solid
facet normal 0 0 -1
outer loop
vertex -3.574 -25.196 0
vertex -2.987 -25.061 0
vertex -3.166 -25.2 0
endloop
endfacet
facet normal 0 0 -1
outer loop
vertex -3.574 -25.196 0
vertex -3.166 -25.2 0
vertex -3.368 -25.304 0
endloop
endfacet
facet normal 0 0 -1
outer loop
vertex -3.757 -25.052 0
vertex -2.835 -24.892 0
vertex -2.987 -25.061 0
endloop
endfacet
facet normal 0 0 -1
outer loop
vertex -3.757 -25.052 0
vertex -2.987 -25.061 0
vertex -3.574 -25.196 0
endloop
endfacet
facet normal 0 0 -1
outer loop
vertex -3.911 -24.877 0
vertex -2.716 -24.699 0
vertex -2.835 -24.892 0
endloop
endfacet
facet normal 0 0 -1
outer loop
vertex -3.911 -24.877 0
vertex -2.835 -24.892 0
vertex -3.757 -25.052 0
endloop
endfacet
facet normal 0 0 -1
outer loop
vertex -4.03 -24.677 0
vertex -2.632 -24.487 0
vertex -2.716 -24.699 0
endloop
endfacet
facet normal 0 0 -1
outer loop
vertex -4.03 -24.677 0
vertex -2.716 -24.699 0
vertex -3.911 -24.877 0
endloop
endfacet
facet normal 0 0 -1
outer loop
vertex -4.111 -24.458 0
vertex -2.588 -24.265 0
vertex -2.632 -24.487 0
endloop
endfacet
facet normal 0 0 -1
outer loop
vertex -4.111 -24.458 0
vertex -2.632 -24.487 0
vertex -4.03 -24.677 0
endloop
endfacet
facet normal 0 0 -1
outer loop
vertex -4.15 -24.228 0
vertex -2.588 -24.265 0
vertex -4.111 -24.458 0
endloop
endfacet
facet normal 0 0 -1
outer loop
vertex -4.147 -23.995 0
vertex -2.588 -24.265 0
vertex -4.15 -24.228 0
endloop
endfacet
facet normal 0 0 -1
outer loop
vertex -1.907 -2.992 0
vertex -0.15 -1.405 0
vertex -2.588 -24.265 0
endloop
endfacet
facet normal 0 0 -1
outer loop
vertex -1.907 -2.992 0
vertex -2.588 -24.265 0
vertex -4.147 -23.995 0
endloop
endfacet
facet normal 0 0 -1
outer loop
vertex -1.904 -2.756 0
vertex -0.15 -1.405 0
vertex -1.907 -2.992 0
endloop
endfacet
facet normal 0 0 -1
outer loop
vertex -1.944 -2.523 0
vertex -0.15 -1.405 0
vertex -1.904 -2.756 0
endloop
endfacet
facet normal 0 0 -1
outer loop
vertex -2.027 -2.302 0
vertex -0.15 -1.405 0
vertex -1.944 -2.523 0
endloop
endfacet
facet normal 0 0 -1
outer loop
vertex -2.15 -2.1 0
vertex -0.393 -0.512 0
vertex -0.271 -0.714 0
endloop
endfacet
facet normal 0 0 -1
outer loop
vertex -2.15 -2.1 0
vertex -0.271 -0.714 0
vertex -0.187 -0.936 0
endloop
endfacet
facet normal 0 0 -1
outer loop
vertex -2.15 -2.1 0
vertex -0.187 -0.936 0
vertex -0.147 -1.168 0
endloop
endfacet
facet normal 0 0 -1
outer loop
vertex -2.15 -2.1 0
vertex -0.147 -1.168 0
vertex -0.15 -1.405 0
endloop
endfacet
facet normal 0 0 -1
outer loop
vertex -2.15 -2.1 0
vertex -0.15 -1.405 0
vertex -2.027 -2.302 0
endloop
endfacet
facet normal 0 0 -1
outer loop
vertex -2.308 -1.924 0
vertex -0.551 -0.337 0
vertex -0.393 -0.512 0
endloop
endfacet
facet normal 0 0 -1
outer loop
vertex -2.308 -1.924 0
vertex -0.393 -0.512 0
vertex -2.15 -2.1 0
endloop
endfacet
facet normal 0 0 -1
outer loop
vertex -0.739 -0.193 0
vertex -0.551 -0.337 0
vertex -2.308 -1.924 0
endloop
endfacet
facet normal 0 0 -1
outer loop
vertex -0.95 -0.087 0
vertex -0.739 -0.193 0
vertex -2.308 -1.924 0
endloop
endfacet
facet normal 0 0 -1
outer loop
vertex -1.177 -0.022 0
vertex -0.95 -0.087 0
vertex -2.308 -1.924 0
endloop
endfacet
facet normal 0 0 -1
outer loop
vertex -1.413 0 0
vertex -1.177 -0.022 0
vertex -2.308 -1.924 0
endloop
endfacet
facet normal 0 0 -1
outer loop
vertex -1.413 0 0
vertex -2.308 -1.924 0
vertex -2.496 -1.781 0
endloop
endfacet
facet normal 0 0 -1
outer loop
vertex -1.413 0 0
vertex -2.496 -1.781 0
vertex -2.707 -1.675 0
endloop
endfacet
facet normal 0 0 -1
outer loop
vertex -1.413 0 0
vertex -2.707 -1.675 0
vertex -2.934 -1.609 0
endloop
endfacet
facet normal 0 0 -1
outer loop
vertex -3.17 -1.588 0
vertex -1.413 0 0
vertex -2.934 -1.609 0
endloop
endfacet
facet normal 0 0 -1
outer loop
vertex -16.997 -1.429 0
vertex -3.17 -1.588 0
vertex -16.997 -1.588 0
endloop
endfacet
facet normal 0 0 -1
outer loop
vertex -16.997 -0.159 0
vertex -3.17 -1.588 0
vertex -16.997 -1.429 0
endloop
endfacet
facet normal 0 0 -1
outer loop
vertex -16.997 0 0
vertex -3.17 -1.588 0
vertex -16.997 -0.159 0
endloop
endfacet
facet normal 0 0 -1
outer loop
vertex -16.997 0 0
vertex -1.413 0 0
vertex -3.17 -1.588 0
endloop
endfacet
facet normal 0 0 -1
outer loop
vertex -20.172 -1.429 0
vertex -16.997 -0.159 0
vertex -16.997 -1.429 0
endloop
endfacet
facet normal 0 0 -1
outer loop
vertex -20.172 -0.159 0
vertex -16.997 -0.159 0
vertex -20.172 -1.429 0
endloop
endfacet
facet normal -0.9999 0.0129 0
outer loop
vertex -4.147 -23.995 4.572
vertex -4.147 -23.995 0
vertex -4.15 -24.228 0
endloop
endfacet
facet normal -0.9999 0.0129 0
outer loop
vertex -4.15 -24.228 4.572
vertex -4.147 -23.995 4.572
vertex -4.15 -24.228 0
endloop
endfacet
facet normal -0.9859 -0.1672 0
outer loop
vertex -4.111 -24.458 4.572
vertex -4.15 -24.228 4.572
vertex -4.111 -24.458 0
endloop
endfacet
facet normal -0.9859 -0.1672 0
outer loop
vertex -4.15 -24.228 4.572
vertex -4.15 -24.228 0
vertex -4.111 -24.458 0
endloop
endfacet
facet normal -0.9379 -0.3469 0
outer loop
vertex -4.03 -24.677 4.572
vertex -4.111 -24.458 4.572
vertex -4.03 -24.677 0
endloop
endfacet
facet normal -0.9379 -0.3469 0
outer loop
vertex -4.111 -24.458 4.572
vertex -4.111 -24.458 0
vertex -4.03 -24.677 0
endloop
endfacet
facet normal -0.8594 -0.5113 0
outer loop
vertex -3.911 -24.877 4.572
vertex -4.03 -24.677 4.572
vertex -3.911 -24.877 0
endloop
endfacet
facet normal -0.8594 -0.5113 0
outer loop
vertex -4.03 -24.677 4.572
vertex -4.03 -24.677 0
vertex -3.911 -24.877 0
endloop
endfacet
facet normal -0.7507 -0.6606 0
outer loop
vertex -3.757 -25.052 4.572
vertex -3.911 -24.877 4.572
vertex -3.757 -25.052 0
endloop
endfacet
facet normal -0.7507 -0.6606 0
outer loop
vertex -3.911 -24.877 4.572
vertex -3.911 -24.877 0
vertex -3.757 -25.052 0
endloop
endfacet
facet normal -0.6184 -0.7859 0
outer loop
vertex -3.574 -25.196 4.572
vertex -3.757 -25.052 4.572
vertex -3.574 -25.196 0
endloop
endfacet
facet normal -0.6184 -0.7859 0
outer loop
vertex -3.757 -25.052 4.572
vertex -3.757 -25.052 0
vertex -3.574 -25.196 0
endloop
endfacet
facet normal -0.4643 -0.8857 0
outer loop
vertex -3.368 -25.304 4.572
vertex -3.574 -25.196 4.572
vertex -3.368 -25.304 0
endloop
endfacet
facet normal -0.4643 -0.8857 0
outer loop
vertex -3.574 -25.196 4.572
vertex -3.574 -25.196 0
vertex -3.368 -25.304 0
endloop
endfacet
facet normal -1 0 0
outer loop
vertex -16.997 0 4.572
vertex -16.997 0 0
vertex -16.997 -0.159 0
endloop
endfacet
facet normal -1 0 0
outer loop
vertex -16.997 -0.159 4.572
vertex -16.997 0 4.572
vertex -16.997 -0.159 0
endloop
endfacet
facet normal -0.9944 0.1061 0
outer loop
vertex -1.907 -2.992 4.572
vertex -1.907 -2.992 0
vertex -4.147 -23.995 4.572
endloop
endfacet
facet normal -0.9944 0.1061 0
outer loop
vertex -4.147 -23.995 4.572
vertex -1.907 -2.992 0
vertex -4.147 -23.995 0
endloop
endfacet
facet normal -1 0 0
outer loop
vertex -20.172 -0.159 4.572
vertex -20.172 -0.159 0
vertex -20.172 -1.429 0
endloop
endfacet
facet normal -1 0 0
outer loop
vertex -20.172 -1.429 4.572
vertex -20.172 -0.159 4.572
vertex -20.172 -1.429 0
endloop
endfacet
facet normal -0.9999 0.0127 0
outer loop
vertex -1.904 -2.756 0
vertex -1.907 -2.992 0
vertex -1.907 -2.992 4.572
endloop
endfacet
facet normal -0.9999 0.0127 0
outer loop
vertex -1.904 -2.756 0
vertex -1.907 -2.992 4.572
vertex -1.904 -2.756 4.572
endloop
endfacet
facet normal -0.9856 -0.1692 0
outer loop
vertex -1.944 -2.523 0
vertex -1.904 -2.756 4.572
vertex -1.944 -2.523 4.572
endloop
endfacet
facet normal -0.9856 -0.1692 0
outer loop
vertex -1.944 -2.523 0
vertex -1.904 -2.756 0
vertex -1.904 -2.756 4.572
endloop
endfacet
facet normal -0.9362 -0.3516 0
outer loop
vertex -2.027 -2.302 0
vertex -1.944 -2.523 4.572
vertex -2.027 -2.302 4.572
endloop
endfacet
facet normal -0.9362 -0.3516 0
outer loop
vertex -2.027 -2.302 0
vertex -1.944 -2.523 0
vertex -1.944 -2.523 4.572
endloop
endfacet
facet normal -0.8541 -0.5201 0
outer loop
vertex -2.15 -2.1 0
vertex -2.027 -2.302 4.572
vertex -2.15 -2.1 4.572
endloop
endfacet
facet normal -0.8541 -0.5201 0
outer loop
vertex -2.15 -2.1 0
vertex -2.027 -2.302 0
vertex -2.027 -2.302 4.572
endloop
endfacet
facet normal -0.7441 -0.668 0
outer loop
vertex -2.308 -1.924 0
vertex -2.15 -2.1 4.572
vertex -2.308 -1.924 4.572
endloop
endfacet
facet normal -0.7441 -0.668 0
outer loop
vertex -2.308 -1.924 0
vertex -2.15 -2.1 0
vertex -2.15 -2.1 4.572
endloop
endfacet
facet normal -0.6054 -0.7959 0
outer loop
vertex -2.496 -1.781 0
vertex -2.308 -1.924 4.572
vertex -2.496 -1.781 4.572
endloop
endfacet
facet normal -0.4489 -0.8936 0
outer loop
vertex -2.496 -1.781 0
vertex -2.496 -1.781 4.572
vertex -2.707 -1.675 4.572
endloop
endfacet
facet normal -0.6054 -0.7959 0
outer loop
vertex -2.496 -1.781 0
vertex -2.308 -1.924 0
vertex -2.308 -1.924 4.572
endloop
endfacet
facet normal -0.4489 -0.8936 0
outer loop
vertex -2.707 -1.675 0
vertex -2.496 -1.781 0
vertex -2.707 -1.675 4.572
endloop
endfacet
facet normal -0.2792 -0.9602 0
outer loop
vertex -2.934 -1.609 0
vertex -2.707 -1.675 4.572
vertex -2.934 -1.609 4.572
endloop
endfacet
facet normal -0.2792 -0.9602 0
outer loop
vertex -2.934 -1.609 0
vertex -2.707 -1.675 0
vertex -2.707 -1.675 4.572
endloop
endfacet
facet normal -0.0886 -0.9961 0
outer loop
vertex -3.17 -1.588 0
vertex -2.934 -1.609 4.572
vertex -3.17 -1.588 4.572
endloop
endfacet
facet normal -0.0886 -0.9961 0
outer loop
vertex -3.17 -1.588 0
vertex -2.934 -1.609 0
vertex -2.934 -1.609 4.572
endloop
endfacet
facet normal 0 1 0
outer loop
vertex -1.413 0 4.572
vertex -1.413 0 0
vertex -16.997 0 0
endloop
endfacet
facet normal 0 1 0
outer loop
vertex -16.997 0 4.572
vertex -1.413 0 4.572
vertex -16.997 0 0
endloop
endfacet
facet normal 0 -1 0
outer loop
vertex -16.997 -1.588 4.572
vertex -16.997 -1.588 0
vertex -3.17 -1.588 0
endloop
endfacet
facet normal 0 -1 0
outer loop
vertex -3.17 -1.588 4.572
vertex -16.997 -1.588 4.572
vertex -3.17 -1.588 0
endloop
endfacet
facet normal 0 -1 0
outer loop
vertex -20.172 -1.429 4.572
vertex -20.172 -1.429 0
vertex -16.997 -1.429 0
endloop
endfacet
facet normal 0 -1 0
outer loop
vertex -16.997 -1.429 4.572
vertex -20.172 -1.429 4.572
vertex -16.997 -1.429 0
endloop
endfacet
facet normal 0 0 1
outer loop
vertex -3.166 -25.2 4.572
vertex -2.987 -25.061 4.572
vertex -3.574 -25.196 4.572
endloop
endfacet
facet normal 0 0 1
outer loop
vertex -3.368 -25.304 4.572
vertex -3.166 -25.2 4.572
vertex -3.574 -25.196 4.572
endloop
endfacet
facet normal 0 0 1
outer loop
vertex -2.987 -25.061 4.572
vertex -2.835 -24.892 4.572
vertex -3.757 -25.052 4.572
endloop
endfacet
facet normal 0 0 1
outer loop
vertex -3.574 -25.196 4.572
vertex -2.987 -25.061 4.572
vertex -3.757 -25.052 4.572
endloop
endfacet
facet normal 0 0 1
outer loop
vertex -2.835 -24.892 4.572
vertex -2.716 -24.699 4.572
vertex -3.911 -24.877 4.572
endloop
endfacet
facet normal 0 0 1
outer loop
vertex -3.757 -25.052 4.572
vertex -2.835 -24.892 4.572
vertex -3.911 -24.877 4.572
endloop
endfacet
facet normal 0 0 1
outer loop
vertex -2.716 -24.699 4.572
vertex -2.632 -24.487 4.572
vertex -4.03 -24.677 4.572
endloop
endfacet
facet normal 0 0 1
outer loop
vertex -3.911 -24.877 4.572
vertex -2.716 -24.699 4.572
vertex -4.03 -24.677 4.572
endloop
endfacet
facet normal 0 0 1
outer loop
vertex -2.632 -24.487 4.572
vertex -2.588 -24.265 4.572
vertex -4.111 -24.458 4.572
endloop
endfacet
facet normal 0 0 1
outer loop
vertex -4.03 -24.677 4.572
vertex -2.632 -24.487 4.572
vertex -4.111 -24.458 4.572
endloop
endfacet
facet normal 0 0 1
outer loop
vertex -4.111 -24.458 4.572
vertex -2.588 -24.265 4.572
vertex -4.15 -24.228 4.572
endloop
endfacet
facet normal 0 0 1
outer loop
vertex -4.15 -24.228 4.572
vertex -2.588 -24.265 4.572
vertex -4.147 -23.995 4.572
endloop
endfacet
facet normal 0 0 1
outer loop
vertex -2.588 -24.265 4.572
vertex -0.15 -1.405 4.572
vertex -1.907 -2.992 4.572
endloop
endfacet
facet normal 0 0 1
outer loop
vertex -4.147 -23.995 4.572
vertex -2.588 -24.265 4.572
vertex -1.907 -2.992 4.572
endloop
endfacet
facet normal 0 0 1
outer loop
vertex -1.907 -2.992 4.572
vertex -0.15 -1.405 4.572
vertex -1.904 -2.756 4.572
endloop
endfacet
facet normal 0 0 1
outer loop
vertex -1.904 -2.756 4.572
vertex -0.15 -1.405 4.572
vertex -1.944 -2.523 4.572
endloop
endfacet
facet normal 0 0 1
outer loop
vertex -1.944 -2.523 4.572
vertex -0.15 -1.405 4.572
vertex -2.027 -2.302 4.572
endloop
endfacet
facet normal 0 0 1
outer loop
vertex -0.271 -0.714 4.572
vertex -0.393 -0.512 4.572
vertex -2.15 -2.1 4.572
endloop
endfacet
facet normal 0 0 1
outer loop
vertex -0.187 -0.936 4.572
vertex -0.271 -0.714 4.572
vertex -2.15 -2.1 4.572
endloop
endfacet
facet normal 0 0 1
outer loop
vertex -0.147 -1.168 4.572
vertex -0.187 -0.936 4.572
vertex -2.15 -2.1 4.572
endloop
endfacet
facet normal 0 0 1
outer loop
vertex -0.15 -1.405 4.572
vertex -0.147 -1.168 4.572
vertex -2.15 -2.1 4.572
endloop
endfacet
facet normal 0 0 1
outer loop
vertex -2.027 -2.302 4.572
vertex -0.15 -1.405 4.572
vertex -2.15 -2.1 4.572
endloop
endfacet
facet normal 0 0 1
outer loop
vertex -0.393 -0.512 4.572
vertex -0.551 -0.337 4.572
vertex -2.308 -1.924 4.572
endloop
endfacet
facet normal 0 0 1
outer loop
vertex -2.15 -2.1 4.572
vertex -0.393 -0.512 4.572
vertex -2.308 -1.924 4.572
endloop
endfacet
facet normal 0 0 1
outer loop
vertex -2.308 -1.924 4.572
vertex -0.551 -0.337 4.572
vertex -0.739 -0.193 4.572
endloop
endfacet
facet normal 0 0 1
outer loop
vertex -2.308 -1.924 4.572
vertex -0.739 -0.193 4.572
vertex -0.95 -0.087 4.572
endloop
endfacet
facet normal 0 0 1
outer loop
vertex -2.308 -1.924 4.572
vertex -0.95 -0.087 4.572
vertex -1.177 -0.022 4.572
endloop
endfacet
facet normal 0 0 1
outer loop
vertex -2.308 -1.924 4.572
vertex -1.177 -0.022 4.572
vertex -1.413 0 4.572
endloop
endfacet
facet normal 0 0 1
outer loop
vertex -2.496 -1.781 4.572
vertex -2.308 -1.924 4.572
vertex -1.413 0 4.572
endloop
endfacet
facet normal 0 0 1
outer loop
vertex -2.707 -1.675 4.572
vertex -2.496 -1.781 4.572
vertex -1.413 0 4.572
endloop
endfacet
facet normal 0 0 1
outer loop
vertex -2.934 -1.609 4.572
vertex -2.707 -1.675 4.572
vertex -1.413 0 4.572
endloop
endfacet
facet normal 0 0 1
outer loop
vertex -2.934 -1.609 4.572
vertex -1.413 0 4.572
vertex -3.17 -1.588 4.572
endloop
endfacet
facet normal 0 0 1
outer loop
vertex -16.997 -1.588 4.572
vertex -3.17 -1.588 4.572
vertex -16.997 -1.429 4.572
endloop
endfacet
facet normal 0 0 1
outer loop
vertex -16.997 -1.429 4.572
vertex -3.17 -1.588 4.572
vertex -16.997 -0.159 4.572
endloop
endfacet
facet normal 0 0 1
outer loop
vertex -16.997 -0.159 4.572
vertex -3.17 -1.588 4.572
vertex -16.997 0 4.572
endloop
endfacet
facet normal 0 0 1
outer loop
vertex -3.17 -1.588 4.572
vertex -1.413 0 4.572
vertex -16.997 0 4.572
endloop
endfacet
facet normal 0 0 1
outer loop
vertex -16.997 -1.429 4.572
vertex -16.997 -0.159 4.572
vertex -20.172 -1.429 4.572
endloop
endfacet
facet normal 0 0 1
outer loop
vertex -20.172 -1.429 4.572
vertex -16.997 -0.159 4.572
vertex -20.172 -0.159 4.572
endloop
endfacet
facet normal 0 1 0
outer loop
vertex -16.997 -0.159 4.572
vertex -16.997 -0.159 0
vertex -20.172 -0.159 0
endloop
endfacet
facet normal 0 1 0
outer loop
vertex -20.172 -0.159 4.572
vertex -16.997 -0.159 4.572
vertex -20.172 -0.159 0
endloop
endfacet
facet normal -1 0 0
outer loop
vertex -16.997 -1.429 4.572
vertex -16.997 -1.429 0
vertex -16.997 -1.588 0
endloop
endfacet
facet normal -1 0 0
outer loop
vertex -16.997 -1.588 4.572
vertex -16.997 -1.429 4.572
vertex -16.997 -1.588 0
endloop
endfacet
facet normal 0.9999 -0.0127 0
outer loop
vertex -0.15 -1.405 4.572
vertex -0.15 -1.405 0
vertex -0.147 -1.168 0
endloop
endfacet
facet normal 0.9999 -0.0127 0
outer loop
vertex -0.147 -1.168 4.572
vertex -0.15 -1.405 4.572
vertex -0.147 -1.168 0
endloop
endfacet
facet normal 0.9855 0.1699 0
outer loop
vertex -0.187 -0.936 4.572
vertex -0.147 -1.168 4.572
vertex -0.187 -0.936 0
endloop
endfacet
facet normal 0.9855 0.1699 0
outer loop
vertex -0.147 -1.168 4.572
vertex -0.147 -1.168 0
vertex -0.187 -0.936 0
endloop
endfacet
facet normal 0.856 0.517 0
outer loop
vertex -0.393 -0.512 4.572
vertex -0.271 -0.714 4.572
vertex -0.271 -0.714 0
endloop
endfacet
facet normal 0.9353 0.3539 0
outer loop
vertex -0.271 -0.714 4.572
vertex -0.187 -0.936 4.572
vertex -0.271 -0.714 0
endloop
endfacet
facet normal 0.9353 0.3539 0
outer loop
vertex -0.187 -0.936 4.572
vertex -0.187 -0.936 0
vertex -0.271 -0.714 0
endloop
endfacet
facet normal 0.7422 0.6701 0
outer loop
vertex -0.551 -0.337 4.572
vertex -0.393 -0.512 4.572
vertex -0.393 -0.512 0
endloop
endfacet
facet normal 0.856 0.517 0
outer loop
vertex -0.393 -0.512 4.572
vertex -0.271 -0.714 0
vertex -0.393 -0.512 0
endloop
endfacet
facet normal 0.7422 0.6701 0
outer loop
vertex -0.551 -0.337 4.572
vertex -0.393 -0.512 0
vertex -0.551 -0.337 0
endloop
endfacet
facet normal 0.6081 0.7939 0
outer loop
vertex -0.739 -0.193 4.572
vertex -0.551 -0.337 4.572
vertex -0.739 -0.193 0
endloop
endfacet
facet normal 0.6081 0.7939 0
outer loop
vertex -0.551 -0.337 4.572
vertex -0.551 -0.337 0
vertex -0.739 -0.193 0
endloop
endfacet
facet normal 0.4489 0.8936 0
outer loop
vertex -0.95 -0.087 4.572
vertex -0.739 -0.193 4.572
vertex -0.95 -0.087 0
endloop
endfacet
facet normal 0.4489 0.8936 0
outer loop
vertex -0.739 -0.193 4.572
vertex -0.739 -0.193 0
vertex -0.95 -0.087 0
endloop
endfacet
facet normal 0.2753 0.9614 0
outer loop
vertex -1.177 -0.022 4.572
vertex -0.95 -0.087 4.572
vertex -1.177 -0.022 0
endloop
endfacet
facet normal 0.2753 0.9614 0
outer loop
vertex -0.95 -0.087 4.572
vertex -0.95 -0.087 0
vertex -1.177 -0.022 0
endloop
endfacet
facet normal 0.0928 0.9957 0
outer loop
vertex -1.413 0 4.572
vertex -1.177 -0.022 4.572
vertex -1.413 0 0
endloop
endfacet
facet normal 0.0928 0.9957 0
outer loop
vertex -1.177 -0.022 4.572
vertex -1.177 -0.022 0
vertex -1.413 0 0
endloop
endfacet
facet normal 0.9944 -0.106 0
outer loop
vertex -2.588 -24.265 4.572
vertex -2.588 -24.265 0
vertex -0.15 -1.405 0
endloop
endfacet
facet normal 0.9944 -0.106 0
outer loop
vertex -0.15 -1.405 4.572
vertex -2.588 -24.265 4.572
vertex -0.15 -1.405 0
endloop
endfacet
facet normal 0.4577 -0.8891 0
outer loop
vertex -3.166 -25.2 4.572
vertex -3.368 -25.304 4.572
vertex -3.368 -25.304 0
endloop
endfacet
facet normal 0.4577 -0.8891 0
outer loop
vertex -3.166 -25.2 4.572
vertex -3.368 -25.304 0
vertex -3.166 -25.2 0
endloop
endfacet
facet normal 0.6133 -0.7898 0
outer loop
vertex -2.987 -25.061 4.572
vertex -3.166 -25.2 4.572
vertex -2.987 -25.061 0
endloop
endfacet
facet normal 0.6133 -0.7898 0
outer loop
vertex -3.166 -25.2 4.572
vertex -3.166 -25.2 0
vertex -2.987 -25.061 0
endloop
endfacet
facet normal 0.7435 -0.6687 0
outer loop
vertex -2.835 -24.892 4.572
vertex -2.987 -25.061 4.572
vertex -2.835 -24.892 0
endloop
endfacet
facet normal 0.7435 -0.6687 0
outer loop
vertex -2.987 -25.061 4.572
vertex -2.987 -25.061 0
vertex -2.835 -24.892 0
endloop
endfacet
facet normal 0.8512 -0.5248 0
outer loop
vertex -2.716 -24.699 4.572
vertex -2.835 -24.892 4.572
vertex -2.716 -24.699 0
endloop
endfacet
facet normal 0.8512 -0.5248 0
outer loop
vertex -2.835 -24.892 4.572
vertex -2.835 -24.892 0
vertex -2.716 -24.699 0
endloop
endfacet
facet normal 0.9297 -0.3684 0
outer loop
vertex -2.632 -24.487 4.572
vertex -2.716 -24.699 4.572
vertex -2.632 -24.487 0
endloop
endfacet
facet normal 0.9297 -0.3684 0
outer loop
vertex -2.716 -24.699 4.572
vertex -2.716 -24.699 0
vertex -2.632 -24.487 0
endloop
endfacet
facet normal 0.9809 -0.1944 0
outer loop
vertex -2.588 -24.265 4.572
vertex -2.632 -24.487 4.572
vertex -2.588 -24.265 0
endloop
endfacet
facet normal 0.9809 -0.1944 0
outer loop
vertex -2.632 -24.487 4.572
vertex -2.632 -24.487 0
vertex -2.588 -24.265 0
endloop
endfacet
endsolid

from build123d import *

# Parameters (mm, degrees)
F1_DEPTH    = 4.572
F2_T1_DEPTH = 4.572
F2_T3_DEPTH = 11.6353556042
F2_T5_DEPTH = 10.2806889376


# Not quite as in the source:
# - a fillet or chamfer that OpenCascade refuses, or shapes differently, is made with other operations: its cross-section is extruded or revolved along the edge and cut away or added


with BuildPart() as f1:
    # F0 (on Top) → F1 (new body)
    with BuildSketch(Plane.XY):
        Polygon((-16.9968333333, -0.15875), (-20.1718333333, -0.15875), (-20.1718333333, -1.42875), (-16.9968333333, -1.42875), (-16.9968333333, -1.5875), (-1.7568333333, -1.5875), (-4.2968333333, -25.4), (-2.7093333333, -25.4), (0, 0), (-16.9968333333, 0), align=None)
    extrude(amount=F1_DEPTH)

    # F2: fillet of radius 1.27 on 4 edges, made by hand

    # F2_s2 → F2_t1 (join)
    with BuildSketch(Plane.XY):
        with BuildLine():
            ThreePointArc((-1.9066682695, -2.9922025264), (-2.2250542944, -2.0084335151), (-3.1695044542, -1.5875))
            Line((-3.1695044542, -1.5875), (-1.7568333333, -1.5875))
            Line((-1.7568333333, -1.5875), (-1.9066682695, -2.9922025264))
        make_face()
    extrude(amount=F2_T1_DEPTH)

    # F2_s4 → F2_t3 (cut)
    with BuildSketch(Plane.XY.offset(-3.5316778021)):
        with BuildLine():
            ThreePointArc((-4.1469983972, -23.9952974736), (-3.8286123722, -24.9790664849), (-2.8841622125, -25.4))
            Line((-2.8841622125, -25.4), (-4.2968333333, -25.4))
            Line((-4.2968333333, -25.4), (-4.1469983972, -23.9952974736))
        make_face()
        with BuildLine():
            ThreePointArc((-0.1498349361, -1.4047025264), (-0.4682209611, -0.4209335151), (-1.4126711208, 0))
            Line((-1.4126711208, 0), (0, 0))
            Line((0, 0), (-0.1498349361, -1.4047025264))
        make_face()
    extrude(amount=F2_T3_DEPTH, mode=Mode.SUBTRACT)

    # F2_s6 → F2_t5 (cut)
    with BuildSketch(Plane.XY.offset(-2.8543444688)):
        with BuildLine():
            ThreePointArc((-3.8510711208, -25.4), (-3.002004636, -25.0744501597), (-2.5882349361, -24.2647025264))
            Line((-2.5882349361, -24.2647025264), (-2.7093333333, -25.4))
            Line((-2.7093333333, -25.4), (-3.8510711208, -25.4))
        make_face()
    extrude(amount=F2_T5_DEPTH, mode=Mode.SUBTRACT)


solid = f1.part
